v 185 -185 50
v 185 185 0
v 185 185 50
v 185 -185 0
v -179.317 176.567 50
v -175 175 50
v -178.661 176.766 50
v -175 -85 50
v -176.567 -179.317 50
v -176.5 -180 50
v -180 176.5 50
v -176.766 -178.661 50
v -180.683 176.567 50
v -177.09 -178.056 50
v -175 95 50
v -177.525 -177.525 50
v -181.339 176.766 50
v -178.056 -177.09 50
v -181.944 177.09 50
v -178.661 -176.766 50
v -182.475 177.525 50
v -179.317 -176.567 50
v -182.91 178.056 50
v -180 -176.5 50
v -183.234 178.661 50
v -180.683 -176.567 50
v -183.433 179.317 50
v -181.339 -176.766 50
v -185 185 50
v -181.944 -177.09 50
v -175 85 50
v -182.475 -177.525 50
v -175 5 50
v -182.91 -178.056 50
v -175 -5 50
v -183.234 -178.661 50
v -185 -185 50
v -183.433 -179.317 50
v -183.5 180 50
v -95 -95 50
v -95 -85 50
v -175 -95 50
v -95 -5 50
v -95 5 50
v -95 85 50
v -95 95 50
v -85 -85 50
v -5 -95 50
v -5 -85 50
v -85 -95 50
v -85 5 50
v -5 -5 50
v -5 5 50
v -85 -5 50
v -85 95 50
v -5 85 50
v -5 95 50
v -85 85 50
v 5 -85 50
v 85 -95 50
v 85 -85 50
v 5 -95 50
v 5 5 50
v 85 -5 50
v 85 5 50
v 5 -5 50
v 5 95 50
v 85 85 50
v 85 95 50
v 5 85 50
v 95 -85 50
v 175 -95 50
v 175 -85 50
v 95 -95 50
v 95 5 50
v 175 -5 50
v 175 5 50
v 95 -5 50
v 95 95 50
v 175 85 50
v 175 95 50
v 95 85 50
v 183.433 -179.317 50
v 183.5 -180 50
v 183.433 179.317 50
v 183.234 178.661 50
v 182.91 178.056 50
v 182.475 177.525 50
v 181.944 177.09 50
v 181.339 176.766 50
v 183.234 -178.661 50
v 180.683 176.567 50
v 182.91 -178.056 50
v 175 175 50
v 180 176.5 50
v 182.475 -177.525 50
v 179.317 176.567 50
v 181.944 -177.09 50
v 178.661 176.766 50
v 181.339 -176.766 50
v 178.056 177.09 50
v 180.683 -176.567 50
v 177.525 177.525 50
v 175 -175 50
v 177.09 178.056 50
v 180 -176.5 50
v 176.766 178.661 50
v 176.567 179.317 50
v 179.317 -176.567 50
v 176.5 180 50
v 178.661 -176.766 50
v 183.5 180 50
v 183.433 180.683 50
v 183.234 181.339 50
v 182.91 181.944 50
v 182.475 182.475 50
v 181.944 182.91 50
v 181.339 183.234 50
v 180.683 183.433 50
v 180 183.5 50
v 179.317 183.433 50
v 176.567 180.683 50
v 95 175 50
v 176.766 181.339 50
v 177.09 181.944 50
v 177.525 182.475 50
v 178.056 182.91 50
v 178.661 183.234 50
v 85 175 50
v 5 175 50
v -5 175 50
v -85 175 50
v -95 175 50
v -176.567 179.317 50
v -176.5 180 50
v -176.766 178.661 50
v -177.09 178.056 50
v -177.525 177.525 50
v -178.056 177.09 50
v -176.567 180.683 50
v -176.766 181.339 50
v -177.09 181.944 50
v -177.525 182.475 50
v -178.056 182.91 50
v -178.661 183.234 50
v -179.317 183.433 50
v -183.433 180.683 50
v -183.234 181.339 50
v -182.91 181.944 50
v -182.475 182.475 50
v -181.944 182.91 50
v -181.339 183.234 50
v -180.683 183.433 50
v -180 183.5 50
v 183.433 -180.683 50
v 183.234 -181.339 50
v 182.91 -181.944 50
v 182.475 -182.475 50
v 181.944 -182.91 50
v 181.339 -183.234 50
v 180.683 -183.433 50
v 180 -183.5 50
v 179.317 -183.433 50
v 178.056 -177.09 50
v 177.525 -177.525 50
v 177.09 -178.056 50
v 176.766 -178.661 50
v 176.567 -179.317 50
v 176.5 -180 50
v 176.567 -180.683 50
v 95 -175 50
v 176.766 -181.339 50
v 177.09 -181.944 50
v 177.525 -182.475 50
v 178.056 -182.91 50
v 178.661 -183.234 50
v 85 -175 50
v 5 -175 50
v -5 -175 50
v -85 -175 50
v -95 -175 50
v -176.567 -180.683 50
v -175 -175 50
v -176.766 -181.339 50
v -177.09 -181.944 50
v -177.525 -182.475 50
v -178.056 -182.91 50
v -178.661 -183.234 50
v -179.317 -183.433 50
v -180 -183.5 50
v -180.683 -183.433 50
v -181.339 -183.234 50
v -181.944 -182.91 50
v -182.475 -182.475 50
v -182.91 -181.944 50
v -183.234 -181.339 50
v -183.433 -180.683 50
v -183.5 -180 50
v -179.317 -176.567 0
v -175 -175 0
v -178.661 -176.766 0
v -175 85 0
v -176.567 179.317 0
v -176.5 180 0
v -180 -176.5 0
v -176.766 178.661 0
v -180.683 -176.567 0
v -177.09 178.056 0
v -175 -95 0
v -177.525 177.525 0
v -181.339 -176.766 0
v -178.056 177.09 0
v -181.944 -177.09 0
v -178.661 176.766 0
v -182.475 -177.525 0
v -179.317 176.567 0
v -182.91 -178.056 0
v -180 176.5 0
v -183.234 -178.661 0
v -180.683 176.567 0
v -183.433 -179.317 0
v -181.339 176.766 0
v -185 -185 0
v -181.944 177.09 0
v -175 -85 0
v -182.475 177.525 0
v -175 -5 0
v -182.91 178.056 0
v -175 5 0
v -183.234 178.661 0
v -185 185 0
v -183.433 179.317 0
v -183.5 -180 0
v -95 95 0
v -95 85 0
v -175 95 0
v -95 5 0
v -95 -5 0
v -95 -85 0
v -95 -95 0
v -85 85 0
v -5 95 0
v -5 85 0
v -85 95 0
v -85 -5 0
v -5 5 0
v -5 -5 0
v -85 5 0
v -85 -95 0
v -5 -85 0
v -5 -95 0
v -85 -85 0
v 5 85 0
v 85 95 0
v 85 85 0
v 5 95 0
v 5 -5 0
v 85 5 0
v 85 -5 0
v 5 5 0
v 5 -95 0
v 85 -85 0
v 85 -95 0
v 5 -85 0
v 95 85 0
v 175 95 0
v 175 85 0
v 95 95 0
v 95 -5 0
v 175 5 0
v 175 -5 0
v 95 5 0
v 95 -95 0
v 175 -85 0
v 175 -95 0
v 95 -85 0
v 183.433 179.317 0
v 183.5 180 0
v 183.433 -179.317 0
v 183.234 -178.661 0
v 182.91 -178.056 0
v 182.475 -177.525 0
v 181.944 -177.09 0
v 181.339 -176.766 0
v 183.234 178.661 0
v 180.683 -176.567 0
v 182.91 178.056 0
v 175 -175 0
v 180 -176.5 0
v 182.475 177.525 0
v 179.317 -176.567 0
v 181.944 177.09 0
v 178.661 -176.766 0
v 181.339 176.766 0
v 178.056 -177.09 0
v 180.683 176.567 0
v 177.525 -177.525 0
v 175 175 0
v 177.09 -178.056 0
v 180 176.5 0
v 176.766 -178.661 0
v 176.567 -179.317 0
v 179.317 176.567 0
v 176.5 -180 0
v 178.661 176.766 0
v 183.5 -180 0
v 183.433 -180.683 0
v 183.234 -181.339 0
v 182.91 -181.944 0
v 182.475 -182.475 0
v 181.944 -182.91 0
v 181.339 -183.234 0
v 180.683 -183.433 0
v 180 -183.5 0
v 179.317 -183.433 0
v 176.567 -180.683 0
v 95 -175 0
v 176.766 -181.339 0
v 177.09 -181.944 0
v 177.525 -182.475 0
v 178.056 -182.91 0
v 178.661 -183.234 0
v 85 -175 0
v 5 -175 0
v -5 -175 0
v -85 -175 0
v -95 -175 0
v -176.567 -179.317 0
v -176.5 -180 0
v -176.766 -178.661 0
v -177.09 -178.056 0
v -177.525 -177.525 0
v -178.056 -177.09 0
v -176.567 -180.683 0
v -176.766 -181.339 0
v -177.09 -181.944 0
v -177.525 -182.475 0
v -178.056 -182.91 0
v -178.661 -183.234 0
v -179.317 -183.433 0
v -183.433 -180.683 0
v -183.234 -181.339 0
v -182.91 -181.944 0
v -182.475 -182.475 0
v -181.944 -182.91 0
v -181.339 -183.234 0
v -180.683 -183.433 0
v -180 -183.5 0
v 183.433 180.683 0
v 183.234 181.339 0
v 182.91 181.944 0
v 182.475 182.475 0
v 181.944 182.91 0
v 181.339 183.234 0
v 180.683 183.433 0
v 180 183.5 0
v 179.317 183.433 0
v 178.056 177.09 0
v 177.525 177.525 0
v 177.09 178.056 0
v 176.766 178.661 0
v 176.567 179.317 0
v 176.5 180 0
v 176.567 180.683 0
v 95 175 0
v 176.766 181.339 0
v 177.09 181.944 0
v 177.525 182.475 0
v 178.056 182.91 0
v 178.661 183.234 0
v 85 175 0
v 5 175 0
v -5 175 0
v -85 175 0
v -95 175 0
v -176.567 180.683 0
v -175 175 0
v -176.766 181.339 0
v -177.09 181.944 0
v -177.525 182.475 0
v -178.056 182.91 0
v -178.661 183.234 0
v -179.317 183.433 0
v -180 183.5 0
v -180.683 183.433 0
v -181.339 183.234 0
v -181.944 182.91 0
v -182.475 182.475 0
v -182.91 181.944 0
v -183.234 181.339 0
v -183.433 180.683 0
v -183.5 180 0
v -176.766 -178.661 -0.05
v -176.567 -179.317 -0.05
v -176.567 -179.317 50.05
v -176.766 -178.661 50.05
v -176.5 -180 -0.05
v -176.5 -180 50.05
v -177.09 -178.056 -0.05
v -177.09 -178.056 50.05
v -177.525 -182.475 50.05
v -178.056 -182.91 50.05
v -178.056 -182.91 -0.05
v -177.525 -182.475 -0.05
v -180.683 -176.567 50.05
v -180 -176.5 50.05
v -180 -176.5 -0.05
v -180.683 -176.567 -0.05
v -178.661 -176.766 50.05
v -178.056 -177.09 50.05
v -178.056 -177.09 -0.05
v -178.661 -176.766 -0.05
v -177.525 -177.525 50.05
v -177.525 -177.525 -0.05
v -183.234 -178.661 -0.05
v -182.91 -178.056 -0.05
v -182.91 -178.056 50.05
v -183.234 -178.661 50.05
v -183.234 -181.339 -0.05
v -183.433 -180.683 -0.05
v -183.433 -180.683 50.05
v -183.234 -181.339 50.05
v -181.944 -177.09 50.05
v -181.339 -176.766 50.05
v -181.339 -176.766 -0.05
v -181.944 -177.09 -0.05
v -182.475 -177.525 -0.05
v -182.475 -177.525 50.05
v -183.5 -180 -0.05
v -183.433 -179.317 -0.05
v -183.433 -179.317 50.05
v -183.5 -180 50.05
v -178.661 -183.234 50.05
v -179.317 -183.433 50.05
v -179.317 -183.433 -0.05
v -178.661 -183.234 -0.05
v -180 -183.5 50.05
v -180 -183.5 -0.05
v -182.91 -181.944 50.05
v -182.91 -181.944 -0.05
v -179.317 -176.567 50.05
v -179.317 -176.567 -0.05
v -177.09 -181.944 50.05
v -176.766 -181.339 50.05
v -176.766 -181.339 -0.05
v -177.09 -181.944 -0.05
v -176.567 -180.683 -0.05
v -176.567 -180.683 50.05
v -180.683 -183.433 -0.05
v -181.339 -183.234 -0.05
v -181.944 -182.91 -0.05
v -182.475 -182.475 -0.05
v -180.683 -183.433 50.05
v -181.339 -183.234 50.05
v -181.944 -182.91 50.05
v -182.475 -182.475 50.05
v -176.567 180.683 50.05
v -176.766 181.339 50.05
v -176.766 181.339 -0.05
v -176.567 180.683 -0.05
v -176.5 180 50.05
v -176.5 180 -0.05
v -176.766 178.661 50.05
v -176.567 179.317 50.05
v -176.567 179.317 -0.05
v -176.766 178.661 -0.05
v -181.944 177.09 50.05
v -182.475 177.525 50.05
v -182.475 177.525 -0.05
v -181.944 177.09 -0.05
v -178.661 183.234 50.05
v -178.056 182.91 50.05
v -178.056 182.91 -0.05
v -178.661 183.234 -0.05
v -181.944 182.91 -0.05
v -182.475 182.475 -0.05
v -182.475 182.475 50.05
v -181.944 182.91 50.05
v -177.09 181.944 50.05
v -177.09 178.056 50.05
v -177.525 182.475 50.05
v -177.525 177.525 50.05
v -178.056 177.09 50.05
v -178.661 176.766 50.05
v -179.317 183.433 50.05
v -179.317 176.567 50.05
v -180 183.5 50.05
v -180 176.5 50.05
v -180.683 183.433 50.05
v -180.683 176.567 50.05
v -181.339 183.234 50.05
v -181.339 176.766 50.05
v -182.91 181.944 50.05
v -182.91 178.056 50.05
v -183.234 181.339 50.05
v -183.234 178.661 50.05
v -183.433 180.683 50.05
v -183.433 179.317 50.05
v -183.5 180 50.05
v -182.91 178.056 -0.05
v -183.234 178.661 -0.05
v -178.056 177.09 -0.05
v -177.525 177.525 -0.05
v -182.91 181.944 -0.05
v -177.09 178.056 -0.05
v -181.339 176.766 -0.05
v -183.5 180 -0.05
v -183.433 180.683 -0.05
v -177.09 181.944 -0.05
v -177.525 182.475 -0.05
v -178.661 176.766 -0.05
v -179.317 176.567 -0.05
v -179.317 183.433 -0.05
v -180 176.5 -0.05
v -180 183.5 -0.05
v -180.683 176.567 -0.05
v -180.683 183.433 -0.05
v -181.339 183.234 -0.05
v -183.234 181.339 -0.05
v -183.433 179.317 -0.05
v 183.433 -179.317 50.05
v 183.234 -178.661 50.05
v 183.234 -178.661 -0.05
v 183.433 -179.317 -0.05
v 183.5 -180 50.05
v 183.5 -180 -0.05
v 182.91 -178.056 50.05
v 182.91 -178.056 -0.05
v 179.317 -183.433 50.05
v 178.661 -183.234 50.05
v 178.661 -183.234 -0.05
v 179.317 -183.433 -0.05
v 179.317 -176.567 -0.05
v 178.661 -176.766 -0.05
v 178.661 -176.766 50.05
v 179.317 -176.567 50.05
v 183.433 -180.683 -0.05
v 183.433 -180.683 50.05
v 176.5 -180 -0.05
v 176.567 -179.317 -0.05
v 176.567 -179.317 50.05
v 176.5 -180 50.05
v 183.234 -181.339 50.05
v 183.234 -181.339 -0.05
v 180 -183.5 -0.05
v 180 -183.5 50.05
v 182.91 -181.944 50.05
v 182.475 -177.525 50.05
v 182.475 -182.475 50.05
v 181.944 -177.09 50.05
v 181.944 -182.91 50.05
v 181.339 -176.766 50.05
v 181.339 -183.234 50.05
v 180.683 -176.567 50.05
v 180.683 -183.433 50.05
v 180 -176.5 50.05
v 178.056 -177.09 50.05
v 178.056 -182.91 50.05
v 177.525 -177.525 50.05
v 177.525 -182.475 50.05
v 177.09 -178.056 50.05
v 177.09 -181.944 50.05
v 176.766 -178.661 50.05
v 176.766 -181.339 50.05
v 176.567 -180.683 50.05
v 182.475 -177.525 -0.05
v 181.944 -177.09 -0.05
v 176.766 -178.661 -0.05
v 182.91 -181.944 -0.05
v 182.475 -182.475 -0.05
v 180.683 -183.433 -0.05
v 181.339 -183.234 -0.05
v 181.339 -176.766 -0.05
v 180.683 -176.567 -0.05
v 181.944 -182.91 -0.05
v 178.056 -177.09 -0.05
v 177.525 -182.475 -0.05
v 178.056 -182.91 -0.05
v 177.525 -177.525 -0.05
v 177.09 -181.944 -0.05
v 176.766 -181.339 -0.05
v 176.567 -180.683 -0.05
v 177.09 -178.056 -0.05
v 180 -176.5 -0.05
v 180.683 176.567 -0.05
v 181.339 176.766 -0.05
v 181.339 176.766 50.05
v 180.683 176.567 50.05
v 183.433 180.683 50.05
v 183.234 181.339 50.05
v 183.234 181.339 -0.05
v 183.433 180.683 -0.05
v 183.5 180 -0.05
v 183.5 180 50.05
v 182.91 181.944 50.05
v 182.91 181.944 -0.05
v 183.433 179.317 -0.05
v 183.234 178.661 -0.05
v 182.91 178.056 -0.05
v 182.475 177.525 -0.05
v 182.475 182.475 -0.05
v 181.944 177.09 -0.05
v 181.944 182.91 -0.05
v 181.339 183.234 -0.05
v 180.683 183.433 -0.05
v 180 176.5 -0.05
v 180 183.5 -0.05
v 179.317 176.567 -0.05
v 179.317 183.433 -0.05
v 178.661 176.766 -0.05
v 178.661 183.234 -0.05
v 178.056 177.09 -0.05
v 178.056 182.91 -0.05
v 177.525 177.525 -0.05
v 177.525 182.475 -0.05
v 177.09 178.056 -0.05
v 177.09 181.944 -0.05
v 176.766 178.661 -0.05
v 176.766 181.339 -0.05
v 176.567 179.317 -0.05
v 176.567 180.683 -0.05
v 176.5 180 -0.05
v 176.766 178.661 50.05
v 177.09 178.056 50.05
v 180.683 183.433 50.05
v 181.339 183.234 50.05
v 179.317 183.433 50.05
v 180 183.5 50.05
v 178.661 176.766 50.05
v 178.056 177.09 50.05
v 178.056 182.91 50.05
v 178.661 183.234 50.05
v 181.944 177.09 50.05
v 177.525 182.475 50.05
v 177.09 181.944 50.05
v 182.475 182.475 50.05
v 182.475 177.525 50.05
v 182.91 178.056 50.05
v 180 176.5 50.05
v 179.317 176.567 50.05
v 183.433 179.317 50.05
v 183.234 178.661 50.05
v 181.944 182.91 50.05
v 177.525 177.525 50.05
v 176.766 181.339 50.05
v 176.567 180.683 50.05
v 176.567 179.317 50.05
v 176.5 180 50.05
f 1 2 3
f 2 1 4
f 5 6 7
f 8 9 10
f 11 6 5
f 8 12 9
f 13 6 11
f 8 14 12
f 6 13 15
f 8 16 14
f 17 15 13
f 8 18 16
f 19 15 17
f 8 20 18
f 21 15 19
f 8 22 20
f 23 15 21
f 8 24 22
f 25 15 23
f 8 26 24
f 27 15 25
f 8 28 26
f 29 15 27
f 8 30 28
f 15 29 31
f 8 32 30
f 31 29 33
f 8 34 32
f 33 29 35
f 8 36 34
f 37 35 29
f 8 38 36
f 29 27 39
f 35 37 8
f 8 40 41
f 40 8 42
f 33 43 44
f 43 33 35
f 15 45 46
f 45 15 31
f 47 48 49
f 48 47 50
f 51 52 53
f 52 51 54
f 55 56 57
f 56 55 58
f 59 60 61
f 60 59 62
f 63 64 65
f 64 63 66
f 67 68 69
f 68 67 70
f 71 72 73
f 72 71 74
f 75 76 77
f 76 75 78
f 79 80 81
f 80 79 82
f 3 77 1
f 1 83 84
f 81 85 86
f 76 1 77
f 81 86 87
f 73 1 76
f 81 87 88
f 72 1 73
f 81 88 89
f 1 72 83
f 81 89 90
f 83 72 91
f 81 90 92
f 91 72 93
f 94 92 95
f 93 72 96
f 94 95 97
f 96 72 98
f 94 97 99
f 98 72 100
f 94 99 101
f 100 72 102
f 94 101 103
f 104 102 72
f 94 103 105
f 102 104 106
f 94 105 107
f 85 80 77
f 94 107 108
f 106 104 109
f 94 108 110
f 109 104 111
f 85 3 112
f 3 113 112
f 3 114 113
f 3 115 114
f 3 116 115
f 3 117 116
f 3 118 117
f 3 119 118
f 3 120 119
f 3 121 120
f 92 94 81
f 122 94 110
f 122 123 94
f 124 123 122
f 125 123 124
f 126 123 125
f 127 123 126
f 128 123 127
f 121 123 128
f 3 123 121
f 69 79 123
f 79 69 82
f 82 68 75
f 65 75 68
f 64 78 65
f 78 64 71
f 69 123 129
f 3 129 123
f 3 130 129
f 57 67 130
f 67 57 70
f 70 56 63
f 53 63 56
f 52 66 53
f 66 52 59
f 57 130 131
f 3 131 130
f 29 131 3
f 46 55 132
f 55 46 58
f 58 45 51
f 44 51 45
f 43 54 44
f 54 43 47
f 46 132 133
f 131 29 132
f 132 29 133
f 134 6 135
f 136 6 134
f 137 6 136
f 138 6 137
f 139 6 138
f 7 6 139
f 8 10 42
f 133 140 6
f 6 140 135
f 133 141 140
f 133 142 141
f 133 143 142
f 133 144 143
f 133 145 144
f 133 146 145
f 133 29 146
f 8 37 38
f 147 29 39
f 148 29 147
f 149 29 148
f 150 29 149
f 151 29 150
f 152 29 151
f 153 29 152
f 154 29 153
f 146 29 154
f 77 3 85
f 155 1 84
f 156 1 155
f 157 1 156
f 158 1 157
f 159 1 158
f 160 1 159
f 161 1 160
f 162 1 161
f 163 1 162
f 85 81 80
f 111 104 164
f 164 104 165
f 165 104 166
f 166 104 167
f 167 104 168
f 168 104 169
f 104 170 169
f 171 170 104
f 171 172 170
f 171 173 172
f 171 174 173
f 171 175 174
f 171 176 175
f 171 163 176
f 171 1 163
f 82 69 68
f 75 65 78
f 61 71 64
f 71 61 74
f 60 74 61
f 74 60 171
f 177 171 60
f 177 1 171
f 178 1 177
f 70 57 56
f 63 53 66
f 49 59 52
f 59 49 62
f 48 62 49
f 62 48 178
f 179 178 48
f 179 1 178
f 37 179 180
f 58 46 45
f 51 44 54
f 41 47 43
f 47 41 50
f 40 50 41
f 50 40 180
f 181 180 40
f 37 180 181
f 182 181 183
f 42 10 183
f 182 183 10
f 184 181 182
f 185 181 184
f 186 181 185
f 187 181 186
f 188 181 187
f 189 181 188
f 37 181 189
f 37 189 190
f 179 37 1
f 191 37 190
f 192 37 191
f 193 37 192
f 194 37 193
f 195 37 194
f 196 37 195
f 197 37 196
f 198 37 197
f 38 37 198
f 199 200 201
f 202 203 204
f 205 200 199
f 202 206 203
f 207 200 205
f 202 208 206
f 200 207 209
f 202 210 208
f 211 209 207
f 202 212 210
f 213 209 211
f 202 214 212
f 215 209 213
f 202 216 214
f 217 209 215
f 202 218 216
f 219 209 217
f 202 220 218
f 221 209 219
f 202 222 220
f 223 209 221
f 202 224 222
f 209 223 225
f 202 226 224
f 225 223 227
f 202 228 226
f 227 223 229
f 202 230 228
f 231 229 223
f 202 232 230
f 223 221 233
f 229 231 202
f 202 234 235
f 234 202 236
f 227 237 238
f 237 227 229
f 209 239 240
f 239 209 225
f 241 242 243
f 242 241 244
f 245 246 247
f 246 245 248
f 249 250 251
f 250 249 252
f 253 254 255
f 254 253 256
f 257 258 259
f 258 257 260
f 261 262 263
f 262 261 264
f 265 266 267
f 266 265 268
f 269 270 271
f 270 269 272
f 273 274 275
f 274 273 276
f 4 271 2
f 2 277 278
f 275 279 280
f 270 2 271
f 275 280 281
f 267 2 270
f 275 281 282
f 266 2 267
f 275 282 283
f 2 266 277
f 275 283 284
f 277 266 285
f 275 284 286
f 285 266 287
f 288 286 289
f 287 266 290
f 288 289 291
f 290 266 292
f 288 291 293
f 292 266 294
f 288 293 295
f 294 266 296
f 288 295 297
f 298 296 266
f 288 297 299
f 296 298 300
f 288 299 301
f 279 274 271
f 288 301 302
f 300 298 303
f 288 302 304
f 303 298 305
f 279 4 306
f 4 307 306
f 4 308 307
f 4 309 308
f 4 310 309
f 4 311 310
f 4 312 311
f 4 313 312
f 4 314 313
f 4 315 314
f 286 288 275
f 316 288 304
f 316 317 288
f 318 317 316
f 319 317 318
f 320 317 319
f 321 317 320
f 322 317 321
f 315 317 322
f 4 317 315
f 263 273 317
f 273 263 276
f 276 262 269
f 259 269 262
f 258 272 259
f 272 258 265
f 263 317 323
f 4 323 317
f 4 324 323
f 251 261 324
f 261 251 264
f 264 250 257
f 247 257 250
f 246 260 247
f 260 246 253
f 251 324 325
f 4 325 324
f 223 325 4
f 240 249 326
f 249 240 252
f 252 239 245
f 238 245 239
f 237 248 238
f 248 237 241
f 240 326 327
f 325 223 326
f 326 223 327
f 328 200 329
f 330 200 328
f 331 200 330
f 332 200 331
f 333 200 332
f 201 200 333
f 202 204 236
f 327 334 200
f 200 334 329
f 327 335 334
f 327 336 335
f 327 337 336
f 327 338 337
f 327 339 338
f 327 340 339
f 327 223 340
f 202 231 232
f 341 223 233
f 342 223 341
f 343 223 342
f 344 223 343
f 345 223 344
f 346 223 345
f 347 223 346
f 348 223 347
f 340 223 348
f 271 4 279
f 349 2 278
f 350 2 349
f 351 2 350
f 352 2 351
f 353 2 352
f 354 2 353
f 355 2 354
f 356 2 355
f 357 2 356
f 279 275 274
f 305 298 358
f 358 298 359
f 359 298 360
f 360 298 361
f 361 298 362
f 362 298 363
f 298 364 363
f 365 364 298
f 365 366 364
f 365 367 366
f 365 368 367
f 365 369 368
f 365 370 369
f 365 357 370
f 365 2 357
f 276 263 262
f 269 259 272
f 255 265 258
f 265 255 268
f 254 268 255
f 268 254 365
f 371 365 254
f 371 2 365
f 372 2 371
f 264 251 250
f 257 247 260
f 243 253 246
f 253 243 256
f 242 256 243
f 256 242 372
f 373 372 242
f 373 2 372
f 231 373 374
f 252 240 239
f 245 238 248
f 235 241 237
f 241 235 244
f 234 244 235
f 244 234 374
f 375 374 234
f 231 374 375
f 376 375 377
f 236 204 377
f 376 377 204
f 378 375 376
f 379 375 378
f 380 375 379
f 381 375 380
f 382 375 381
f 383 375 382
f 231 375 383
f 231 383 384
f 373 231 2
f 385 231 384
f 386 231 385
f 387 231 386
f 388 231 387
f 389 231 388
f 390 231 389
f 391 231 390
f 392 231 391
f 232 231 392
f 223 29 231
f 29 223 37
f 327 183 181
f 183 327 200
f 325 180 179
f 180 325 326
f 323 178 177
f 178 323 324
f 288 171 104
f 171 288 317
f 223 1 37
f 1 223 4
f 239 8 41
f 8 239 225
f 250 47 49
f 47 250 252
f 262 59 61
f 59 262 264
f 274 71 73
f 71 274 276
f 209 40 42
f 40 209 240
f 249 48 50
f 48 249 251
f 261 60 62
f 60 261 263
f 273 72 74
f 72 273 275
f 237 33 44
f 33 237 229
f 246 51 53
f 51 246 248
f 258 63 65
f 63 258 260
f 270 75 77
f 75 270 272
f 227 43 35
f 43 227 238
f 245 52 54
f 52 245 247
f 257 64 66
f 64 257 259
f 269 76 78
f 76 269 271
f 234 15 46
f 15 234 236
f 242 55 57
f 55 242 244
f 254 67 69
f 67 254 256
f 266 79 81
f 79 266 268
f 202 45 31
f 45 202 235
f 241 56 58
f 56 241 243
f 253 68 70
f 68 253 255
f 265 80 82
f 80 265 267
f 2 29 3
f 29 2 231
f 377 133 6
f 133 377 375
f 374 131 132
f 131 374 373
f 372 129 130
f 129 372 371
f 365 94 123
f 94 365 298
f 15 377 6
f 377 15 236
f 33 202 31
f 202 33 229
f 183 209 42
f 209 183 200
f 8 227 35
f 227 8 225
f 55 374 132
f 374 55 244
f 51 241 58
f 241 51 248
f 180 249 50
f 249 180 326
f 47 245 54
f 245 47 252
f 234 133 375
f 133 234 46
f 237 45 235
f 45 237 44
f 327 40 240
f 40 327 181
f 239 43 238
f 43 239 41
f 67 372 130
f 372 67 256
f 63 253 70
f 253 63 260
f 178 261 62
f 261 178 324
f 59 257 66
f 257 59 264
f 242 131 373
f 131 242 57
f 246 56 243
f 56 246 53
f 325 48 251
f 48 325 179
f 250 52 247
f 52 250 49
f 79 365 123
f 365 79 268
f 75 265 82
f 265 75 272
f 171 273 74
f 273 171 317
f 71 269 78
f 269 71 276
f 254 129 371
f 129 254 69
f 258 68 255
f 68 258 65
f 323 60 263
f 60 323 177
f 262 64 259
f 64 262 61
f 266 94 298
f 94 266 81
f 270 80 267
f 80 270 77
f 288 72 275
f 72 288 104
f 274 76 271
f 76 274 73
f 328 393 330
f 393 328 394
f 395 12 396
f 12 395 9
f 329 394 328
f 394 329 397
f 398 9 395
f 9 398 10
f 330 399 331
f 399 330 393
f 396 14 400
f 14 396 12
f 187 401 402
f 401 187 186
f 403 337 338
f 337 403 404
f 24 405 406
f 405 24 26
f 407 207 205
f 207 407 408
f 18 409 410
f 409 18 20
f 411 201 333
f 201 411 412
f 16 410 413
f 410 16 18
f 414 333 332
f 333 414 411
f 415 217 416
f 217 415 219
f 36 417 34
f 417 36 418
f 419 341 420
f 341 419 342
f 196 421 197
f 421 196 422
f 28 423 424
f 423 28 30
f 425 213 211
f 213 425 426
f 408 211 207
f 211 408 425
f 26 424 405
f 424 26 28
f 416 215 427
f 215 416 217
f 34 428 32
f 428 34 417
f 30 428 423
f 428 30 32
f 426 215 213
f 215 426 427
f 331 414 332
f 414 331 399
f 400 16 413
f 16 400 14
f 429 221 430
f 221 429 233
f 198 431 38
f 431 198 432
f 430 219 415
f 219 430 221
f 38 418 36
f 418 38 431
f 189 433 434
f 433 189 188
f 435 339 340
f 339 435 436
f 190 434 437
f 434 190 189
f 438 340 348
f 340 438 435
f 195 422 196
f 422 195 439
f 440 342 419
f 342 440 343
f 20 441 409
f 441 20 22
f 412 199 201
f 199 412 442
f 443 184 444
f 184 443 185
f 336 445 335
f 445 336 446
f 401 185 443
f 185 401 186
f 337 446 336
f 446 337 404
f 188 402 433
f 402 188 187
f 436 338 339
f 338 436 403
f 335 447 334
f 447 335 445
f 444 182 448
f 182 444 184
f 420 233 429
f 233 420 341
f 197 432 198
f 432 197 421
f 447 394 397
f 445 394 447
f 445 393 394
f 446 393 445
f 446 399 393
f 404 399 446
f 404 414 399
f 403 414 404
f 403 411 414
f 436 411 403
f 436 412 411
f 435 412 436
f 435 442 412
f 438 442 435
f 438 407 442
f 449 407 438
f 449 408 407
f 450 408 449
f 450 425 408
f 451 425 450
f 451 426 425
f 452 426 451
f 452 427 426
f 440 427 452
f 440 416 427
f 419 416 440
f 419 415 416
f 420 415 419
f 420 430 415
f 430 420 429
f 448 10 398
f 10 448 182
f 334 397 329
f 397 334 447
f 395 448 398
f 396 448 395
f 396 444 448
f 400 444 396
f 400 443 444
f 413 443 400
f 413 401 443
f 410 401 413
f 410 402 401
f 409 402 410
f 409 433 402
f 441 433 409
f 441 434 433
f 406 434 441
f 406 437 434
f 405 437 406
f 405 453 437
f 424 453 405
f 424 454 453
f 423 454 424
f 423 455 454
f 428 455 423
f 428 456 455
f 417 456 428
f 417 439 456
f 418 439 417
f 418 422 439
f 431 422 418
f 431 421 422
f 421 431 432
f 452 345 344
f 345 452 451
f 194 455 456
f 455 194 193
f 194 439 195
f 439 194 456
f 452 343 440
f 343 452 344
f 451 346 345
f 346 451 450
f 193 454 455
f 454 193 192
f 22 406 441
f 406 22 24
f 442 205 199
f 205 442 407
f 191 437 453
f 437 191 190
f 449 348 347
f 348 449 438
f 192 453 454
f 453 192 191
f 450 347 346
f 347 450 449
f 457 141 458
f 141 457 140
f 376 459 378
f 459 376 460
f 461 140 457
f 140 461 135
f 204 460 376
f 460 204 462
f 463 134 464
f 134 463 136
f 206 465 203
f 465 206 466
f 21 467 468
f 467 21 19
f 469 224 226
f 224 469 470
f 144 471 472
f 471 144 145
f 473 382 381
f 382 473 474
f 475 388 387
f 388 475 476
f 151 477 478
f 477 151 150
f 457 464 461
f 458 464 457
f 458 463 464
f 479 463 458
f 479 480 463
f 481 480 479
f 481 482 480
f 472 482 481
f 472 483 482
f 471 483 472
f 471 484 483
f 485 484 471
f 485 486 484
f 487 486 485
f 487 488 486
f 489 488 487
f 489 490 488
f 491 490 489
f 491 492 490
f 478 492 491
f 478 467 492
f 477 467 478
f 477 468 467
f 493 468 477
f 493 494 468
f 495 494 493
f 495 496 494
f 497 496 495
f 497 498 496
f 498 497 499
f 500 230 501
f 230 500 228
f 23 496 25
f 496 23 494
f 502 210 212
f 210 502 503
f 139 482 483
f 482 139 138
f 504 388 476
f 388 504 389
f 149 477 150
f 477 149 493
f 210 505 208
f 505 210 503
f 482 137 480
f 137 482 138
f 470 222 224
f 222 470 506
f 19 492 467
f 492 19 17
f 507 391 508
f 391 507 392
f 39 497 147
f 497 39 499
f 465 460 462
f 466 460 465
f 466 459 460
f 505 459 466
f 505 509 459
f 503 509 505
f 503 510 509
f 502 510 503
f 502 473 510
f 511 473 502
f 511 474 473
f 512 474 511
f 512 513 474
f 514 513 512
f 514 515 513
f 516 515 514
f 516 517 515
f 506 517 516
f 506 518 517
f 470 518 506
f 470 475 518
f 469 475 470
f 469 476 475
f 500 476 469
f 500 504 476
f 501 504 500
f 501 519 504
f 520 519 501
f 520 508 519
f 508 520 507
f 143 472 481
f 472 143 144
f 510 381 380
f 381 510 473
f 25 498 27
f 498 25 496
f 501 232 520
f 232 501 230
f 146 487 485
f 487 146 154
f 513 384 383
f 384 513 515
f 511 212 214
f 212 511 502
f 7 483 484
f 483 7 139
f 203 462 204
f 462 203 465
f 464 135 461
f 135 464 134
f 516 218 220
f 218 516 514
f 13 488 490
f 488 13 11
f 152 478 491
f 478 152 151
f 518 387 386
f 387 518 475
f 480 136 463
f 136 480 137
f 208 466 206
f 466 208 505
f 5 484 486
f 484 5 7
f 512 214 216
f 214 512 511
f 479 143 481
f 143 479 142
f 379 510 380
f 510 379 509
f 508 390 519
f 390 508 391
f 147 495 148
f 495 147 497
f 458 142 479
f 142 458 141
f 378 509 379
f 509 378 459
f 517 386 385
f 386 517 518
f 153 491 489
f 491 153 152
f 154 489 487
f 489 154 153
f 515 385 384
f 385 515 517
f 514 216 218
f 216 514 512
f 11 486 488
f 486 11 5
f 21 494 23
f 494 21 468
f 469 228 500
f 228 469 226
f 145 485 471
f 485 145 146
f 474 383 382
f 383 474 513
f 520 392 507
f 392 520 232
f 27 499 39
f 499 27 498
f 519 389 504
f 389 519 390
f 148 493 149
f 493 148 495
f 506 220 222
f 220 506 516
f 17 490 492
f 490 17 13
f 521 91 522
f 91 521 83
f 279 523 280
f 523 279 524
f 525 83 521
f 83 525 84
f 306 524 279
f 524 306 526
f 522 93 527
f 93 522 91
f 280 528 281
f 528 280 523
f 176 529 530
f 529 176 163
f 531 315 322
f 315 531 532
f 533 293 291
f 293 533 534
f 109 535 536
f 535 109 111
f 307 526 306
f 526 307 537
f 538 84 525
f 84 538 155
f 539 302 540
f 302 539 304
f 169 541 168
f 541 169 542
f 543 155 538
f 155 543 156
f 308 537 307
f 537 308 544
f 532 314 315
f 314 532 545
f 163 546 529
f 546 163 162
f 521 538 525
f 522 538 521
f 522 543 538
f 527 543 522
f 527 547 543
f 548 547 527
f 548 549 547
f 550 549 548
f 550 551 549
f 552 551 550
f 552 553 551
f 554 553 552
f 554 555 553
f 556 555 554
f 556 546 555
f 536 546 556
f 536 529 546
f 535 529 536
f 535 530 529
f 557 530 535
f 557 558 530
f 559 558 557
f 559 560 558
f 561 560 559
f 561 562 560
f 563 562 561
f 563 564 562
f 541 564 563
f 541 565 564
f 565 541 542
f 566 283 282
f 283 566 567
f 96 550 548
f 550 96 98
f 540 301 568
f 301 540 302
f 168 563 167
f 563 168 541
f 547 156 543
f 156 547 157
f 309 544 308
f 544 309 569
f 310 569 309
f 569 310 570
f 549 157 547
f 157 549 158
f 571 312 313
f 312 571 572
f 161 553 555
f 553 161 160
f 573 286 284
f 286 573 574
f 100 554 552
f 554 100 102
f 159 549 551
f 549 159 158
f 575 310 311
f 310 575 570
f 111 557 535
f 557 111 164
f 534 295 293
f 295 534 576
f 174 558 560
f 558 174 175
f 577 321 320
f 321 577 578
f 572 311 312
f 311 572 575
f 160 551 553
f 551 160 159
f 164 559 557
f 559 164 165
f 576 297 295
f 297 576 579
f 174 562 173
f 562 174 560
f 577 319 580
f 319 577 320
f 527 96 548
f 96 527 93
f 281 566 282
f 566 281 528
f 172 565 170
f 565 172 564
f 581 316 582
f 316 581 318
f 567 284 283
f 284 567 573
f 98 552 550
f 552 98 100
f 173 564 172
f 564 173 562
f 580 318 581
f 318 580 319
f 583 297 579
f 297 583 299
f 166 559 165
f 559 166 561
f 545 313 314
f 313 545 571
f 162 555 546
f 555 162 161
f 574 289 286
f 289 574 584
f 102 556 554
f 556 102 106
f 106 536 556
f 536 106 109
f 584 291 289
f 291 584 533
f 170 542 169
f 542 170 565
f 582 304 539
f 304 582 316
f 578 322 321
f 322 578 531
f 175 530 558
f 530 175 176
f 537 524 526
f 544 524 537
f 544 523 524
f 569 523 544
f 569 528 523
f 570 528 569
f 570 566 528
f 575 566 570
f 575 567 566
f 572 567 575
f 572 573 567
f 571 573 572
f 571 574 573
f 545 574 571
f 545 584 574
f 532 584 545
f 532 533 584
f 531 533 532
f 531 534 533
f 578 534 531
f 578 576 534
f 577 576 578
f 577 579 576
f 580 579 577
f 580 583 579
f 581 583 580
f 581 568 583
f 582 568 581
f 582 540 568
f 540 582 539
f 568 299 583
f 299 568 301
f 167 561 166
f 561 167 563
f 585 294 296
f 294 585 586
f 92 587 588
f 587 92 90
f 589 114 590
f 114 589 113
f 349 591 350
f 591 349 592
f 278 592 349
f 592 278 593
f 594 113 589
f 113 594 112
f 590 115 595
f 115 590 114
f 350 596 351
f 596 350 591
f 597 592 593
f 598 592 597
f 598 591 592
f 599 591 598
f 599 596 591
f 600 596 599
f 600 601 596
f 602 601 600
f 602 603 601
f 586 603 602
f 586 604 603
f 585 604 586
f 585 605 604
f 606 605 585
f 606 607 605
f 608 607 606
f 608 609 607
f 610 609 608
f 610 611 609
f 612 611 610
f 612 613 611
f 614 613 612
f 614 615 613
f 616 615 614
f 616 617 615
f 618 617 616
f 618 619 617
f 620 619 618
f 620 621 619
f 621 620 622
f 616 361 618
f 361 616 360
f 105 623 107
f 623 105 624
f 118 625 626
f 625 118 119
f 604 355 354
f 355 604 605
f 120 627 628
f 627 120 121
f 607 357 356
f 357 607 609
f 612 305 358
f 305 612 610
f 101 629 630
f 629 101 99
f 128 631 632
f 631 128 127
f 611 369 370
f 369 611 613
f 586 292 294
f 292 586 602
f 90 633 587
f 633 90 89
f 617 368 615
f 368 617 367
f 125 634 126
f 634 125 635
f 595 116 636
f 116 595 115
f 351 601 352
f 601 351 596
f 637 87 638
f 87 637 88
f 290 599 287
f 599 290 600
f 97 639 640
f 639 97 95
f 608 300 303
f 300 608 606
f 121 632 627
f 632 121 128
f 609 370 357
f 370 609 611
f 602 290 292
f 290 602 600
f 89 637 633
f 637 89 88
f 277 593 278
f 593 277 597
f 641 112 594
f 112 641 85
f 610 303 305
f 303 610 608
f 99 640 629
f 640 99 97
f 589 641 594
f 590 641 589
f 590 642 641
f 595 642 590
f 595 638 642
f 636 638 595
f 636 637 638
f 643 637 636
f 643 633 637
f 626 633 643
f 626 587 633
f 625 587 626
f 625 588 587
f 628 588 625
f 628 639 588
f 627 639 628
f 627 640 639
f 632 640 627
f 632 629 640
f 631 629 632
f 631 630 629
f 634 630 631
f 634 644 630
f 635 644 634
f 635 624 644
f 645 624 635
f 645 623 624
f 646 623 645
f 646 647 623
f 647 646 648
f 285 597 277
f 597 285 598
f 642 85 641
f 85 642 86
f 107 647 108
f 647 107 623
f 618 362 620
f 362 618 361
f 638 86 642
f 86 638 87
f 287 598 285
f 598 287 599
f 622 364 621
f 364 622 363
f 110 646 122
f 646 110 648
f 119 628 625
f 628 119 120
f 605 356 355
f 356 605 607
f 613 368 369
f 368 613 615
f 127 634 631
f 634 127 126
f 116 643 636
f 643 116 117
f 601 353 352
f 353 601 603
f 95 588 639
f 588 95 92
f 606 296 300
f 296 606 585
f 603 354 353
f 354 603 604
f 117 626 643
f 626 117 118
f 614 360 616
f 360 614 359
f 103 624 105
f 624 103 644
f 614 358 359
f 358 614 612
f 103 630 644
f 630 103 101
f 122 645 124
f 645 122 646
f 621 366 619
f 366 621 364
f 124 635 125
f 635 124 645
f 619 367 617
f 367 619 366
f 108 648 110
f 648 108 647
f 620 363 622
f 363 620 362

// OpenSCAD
// Part Name: Cage_Layer_5_H50mm
// This part represents a horizontal slice of the cage.
// It is designed to be 3D printed on its base.

// Parameters for the cage
bar_t = 10;
gap_xy = 80;
hole_d = 7;
cage_ext_xy = 370;

// Calculate bar center positions relative to the overall cage center
bar_centers_xy = [for (j = [0:4]) (-cage_ext_xy/2 + bar_t/2 + j * (bar_t + gap_xy))];

// Module to generate a single layer segment
module cage_layer_segment(height) {
    // Offset for printing on z=0 plane. The module itself is centered on XY=0, so this Z offset moves its base to Z=0.
    translate([0, 0, height/2]) {
        union() {
            // Horizontal bars (along X)
            for (y_center = bar_centers_xy) {
                translate([0, y_center, 0])
                cube([cage_ext_xy, bar_t, height], center = true);
            }

            // Vertical bars (along Y)
            for (x_center = bar_centers_xy) {
                translate([x_center, 0, 0])
                cube([bar_t, cage_ext_xy, height], center = true);
            }

            // Subtract holes for M6 rods at the 4 corners
            corner_offsets_xy = [bar_centers_xy[0], bar_centers_xy[4]];

            for (x_offset = corner_offsets_xy) {
                for (y_offset = corner_offsets_xy) {
                    // Hole through the center of the corner bar
                    translate([x_offset, y_offset, 0])
                    cylinder(h = height + 0.1, d = hole_d, center = true, $fn=32); // +0.1 for clean cut
                }
            }
        }
    }
}

// Render the segment
cage_layer_segment(50);
